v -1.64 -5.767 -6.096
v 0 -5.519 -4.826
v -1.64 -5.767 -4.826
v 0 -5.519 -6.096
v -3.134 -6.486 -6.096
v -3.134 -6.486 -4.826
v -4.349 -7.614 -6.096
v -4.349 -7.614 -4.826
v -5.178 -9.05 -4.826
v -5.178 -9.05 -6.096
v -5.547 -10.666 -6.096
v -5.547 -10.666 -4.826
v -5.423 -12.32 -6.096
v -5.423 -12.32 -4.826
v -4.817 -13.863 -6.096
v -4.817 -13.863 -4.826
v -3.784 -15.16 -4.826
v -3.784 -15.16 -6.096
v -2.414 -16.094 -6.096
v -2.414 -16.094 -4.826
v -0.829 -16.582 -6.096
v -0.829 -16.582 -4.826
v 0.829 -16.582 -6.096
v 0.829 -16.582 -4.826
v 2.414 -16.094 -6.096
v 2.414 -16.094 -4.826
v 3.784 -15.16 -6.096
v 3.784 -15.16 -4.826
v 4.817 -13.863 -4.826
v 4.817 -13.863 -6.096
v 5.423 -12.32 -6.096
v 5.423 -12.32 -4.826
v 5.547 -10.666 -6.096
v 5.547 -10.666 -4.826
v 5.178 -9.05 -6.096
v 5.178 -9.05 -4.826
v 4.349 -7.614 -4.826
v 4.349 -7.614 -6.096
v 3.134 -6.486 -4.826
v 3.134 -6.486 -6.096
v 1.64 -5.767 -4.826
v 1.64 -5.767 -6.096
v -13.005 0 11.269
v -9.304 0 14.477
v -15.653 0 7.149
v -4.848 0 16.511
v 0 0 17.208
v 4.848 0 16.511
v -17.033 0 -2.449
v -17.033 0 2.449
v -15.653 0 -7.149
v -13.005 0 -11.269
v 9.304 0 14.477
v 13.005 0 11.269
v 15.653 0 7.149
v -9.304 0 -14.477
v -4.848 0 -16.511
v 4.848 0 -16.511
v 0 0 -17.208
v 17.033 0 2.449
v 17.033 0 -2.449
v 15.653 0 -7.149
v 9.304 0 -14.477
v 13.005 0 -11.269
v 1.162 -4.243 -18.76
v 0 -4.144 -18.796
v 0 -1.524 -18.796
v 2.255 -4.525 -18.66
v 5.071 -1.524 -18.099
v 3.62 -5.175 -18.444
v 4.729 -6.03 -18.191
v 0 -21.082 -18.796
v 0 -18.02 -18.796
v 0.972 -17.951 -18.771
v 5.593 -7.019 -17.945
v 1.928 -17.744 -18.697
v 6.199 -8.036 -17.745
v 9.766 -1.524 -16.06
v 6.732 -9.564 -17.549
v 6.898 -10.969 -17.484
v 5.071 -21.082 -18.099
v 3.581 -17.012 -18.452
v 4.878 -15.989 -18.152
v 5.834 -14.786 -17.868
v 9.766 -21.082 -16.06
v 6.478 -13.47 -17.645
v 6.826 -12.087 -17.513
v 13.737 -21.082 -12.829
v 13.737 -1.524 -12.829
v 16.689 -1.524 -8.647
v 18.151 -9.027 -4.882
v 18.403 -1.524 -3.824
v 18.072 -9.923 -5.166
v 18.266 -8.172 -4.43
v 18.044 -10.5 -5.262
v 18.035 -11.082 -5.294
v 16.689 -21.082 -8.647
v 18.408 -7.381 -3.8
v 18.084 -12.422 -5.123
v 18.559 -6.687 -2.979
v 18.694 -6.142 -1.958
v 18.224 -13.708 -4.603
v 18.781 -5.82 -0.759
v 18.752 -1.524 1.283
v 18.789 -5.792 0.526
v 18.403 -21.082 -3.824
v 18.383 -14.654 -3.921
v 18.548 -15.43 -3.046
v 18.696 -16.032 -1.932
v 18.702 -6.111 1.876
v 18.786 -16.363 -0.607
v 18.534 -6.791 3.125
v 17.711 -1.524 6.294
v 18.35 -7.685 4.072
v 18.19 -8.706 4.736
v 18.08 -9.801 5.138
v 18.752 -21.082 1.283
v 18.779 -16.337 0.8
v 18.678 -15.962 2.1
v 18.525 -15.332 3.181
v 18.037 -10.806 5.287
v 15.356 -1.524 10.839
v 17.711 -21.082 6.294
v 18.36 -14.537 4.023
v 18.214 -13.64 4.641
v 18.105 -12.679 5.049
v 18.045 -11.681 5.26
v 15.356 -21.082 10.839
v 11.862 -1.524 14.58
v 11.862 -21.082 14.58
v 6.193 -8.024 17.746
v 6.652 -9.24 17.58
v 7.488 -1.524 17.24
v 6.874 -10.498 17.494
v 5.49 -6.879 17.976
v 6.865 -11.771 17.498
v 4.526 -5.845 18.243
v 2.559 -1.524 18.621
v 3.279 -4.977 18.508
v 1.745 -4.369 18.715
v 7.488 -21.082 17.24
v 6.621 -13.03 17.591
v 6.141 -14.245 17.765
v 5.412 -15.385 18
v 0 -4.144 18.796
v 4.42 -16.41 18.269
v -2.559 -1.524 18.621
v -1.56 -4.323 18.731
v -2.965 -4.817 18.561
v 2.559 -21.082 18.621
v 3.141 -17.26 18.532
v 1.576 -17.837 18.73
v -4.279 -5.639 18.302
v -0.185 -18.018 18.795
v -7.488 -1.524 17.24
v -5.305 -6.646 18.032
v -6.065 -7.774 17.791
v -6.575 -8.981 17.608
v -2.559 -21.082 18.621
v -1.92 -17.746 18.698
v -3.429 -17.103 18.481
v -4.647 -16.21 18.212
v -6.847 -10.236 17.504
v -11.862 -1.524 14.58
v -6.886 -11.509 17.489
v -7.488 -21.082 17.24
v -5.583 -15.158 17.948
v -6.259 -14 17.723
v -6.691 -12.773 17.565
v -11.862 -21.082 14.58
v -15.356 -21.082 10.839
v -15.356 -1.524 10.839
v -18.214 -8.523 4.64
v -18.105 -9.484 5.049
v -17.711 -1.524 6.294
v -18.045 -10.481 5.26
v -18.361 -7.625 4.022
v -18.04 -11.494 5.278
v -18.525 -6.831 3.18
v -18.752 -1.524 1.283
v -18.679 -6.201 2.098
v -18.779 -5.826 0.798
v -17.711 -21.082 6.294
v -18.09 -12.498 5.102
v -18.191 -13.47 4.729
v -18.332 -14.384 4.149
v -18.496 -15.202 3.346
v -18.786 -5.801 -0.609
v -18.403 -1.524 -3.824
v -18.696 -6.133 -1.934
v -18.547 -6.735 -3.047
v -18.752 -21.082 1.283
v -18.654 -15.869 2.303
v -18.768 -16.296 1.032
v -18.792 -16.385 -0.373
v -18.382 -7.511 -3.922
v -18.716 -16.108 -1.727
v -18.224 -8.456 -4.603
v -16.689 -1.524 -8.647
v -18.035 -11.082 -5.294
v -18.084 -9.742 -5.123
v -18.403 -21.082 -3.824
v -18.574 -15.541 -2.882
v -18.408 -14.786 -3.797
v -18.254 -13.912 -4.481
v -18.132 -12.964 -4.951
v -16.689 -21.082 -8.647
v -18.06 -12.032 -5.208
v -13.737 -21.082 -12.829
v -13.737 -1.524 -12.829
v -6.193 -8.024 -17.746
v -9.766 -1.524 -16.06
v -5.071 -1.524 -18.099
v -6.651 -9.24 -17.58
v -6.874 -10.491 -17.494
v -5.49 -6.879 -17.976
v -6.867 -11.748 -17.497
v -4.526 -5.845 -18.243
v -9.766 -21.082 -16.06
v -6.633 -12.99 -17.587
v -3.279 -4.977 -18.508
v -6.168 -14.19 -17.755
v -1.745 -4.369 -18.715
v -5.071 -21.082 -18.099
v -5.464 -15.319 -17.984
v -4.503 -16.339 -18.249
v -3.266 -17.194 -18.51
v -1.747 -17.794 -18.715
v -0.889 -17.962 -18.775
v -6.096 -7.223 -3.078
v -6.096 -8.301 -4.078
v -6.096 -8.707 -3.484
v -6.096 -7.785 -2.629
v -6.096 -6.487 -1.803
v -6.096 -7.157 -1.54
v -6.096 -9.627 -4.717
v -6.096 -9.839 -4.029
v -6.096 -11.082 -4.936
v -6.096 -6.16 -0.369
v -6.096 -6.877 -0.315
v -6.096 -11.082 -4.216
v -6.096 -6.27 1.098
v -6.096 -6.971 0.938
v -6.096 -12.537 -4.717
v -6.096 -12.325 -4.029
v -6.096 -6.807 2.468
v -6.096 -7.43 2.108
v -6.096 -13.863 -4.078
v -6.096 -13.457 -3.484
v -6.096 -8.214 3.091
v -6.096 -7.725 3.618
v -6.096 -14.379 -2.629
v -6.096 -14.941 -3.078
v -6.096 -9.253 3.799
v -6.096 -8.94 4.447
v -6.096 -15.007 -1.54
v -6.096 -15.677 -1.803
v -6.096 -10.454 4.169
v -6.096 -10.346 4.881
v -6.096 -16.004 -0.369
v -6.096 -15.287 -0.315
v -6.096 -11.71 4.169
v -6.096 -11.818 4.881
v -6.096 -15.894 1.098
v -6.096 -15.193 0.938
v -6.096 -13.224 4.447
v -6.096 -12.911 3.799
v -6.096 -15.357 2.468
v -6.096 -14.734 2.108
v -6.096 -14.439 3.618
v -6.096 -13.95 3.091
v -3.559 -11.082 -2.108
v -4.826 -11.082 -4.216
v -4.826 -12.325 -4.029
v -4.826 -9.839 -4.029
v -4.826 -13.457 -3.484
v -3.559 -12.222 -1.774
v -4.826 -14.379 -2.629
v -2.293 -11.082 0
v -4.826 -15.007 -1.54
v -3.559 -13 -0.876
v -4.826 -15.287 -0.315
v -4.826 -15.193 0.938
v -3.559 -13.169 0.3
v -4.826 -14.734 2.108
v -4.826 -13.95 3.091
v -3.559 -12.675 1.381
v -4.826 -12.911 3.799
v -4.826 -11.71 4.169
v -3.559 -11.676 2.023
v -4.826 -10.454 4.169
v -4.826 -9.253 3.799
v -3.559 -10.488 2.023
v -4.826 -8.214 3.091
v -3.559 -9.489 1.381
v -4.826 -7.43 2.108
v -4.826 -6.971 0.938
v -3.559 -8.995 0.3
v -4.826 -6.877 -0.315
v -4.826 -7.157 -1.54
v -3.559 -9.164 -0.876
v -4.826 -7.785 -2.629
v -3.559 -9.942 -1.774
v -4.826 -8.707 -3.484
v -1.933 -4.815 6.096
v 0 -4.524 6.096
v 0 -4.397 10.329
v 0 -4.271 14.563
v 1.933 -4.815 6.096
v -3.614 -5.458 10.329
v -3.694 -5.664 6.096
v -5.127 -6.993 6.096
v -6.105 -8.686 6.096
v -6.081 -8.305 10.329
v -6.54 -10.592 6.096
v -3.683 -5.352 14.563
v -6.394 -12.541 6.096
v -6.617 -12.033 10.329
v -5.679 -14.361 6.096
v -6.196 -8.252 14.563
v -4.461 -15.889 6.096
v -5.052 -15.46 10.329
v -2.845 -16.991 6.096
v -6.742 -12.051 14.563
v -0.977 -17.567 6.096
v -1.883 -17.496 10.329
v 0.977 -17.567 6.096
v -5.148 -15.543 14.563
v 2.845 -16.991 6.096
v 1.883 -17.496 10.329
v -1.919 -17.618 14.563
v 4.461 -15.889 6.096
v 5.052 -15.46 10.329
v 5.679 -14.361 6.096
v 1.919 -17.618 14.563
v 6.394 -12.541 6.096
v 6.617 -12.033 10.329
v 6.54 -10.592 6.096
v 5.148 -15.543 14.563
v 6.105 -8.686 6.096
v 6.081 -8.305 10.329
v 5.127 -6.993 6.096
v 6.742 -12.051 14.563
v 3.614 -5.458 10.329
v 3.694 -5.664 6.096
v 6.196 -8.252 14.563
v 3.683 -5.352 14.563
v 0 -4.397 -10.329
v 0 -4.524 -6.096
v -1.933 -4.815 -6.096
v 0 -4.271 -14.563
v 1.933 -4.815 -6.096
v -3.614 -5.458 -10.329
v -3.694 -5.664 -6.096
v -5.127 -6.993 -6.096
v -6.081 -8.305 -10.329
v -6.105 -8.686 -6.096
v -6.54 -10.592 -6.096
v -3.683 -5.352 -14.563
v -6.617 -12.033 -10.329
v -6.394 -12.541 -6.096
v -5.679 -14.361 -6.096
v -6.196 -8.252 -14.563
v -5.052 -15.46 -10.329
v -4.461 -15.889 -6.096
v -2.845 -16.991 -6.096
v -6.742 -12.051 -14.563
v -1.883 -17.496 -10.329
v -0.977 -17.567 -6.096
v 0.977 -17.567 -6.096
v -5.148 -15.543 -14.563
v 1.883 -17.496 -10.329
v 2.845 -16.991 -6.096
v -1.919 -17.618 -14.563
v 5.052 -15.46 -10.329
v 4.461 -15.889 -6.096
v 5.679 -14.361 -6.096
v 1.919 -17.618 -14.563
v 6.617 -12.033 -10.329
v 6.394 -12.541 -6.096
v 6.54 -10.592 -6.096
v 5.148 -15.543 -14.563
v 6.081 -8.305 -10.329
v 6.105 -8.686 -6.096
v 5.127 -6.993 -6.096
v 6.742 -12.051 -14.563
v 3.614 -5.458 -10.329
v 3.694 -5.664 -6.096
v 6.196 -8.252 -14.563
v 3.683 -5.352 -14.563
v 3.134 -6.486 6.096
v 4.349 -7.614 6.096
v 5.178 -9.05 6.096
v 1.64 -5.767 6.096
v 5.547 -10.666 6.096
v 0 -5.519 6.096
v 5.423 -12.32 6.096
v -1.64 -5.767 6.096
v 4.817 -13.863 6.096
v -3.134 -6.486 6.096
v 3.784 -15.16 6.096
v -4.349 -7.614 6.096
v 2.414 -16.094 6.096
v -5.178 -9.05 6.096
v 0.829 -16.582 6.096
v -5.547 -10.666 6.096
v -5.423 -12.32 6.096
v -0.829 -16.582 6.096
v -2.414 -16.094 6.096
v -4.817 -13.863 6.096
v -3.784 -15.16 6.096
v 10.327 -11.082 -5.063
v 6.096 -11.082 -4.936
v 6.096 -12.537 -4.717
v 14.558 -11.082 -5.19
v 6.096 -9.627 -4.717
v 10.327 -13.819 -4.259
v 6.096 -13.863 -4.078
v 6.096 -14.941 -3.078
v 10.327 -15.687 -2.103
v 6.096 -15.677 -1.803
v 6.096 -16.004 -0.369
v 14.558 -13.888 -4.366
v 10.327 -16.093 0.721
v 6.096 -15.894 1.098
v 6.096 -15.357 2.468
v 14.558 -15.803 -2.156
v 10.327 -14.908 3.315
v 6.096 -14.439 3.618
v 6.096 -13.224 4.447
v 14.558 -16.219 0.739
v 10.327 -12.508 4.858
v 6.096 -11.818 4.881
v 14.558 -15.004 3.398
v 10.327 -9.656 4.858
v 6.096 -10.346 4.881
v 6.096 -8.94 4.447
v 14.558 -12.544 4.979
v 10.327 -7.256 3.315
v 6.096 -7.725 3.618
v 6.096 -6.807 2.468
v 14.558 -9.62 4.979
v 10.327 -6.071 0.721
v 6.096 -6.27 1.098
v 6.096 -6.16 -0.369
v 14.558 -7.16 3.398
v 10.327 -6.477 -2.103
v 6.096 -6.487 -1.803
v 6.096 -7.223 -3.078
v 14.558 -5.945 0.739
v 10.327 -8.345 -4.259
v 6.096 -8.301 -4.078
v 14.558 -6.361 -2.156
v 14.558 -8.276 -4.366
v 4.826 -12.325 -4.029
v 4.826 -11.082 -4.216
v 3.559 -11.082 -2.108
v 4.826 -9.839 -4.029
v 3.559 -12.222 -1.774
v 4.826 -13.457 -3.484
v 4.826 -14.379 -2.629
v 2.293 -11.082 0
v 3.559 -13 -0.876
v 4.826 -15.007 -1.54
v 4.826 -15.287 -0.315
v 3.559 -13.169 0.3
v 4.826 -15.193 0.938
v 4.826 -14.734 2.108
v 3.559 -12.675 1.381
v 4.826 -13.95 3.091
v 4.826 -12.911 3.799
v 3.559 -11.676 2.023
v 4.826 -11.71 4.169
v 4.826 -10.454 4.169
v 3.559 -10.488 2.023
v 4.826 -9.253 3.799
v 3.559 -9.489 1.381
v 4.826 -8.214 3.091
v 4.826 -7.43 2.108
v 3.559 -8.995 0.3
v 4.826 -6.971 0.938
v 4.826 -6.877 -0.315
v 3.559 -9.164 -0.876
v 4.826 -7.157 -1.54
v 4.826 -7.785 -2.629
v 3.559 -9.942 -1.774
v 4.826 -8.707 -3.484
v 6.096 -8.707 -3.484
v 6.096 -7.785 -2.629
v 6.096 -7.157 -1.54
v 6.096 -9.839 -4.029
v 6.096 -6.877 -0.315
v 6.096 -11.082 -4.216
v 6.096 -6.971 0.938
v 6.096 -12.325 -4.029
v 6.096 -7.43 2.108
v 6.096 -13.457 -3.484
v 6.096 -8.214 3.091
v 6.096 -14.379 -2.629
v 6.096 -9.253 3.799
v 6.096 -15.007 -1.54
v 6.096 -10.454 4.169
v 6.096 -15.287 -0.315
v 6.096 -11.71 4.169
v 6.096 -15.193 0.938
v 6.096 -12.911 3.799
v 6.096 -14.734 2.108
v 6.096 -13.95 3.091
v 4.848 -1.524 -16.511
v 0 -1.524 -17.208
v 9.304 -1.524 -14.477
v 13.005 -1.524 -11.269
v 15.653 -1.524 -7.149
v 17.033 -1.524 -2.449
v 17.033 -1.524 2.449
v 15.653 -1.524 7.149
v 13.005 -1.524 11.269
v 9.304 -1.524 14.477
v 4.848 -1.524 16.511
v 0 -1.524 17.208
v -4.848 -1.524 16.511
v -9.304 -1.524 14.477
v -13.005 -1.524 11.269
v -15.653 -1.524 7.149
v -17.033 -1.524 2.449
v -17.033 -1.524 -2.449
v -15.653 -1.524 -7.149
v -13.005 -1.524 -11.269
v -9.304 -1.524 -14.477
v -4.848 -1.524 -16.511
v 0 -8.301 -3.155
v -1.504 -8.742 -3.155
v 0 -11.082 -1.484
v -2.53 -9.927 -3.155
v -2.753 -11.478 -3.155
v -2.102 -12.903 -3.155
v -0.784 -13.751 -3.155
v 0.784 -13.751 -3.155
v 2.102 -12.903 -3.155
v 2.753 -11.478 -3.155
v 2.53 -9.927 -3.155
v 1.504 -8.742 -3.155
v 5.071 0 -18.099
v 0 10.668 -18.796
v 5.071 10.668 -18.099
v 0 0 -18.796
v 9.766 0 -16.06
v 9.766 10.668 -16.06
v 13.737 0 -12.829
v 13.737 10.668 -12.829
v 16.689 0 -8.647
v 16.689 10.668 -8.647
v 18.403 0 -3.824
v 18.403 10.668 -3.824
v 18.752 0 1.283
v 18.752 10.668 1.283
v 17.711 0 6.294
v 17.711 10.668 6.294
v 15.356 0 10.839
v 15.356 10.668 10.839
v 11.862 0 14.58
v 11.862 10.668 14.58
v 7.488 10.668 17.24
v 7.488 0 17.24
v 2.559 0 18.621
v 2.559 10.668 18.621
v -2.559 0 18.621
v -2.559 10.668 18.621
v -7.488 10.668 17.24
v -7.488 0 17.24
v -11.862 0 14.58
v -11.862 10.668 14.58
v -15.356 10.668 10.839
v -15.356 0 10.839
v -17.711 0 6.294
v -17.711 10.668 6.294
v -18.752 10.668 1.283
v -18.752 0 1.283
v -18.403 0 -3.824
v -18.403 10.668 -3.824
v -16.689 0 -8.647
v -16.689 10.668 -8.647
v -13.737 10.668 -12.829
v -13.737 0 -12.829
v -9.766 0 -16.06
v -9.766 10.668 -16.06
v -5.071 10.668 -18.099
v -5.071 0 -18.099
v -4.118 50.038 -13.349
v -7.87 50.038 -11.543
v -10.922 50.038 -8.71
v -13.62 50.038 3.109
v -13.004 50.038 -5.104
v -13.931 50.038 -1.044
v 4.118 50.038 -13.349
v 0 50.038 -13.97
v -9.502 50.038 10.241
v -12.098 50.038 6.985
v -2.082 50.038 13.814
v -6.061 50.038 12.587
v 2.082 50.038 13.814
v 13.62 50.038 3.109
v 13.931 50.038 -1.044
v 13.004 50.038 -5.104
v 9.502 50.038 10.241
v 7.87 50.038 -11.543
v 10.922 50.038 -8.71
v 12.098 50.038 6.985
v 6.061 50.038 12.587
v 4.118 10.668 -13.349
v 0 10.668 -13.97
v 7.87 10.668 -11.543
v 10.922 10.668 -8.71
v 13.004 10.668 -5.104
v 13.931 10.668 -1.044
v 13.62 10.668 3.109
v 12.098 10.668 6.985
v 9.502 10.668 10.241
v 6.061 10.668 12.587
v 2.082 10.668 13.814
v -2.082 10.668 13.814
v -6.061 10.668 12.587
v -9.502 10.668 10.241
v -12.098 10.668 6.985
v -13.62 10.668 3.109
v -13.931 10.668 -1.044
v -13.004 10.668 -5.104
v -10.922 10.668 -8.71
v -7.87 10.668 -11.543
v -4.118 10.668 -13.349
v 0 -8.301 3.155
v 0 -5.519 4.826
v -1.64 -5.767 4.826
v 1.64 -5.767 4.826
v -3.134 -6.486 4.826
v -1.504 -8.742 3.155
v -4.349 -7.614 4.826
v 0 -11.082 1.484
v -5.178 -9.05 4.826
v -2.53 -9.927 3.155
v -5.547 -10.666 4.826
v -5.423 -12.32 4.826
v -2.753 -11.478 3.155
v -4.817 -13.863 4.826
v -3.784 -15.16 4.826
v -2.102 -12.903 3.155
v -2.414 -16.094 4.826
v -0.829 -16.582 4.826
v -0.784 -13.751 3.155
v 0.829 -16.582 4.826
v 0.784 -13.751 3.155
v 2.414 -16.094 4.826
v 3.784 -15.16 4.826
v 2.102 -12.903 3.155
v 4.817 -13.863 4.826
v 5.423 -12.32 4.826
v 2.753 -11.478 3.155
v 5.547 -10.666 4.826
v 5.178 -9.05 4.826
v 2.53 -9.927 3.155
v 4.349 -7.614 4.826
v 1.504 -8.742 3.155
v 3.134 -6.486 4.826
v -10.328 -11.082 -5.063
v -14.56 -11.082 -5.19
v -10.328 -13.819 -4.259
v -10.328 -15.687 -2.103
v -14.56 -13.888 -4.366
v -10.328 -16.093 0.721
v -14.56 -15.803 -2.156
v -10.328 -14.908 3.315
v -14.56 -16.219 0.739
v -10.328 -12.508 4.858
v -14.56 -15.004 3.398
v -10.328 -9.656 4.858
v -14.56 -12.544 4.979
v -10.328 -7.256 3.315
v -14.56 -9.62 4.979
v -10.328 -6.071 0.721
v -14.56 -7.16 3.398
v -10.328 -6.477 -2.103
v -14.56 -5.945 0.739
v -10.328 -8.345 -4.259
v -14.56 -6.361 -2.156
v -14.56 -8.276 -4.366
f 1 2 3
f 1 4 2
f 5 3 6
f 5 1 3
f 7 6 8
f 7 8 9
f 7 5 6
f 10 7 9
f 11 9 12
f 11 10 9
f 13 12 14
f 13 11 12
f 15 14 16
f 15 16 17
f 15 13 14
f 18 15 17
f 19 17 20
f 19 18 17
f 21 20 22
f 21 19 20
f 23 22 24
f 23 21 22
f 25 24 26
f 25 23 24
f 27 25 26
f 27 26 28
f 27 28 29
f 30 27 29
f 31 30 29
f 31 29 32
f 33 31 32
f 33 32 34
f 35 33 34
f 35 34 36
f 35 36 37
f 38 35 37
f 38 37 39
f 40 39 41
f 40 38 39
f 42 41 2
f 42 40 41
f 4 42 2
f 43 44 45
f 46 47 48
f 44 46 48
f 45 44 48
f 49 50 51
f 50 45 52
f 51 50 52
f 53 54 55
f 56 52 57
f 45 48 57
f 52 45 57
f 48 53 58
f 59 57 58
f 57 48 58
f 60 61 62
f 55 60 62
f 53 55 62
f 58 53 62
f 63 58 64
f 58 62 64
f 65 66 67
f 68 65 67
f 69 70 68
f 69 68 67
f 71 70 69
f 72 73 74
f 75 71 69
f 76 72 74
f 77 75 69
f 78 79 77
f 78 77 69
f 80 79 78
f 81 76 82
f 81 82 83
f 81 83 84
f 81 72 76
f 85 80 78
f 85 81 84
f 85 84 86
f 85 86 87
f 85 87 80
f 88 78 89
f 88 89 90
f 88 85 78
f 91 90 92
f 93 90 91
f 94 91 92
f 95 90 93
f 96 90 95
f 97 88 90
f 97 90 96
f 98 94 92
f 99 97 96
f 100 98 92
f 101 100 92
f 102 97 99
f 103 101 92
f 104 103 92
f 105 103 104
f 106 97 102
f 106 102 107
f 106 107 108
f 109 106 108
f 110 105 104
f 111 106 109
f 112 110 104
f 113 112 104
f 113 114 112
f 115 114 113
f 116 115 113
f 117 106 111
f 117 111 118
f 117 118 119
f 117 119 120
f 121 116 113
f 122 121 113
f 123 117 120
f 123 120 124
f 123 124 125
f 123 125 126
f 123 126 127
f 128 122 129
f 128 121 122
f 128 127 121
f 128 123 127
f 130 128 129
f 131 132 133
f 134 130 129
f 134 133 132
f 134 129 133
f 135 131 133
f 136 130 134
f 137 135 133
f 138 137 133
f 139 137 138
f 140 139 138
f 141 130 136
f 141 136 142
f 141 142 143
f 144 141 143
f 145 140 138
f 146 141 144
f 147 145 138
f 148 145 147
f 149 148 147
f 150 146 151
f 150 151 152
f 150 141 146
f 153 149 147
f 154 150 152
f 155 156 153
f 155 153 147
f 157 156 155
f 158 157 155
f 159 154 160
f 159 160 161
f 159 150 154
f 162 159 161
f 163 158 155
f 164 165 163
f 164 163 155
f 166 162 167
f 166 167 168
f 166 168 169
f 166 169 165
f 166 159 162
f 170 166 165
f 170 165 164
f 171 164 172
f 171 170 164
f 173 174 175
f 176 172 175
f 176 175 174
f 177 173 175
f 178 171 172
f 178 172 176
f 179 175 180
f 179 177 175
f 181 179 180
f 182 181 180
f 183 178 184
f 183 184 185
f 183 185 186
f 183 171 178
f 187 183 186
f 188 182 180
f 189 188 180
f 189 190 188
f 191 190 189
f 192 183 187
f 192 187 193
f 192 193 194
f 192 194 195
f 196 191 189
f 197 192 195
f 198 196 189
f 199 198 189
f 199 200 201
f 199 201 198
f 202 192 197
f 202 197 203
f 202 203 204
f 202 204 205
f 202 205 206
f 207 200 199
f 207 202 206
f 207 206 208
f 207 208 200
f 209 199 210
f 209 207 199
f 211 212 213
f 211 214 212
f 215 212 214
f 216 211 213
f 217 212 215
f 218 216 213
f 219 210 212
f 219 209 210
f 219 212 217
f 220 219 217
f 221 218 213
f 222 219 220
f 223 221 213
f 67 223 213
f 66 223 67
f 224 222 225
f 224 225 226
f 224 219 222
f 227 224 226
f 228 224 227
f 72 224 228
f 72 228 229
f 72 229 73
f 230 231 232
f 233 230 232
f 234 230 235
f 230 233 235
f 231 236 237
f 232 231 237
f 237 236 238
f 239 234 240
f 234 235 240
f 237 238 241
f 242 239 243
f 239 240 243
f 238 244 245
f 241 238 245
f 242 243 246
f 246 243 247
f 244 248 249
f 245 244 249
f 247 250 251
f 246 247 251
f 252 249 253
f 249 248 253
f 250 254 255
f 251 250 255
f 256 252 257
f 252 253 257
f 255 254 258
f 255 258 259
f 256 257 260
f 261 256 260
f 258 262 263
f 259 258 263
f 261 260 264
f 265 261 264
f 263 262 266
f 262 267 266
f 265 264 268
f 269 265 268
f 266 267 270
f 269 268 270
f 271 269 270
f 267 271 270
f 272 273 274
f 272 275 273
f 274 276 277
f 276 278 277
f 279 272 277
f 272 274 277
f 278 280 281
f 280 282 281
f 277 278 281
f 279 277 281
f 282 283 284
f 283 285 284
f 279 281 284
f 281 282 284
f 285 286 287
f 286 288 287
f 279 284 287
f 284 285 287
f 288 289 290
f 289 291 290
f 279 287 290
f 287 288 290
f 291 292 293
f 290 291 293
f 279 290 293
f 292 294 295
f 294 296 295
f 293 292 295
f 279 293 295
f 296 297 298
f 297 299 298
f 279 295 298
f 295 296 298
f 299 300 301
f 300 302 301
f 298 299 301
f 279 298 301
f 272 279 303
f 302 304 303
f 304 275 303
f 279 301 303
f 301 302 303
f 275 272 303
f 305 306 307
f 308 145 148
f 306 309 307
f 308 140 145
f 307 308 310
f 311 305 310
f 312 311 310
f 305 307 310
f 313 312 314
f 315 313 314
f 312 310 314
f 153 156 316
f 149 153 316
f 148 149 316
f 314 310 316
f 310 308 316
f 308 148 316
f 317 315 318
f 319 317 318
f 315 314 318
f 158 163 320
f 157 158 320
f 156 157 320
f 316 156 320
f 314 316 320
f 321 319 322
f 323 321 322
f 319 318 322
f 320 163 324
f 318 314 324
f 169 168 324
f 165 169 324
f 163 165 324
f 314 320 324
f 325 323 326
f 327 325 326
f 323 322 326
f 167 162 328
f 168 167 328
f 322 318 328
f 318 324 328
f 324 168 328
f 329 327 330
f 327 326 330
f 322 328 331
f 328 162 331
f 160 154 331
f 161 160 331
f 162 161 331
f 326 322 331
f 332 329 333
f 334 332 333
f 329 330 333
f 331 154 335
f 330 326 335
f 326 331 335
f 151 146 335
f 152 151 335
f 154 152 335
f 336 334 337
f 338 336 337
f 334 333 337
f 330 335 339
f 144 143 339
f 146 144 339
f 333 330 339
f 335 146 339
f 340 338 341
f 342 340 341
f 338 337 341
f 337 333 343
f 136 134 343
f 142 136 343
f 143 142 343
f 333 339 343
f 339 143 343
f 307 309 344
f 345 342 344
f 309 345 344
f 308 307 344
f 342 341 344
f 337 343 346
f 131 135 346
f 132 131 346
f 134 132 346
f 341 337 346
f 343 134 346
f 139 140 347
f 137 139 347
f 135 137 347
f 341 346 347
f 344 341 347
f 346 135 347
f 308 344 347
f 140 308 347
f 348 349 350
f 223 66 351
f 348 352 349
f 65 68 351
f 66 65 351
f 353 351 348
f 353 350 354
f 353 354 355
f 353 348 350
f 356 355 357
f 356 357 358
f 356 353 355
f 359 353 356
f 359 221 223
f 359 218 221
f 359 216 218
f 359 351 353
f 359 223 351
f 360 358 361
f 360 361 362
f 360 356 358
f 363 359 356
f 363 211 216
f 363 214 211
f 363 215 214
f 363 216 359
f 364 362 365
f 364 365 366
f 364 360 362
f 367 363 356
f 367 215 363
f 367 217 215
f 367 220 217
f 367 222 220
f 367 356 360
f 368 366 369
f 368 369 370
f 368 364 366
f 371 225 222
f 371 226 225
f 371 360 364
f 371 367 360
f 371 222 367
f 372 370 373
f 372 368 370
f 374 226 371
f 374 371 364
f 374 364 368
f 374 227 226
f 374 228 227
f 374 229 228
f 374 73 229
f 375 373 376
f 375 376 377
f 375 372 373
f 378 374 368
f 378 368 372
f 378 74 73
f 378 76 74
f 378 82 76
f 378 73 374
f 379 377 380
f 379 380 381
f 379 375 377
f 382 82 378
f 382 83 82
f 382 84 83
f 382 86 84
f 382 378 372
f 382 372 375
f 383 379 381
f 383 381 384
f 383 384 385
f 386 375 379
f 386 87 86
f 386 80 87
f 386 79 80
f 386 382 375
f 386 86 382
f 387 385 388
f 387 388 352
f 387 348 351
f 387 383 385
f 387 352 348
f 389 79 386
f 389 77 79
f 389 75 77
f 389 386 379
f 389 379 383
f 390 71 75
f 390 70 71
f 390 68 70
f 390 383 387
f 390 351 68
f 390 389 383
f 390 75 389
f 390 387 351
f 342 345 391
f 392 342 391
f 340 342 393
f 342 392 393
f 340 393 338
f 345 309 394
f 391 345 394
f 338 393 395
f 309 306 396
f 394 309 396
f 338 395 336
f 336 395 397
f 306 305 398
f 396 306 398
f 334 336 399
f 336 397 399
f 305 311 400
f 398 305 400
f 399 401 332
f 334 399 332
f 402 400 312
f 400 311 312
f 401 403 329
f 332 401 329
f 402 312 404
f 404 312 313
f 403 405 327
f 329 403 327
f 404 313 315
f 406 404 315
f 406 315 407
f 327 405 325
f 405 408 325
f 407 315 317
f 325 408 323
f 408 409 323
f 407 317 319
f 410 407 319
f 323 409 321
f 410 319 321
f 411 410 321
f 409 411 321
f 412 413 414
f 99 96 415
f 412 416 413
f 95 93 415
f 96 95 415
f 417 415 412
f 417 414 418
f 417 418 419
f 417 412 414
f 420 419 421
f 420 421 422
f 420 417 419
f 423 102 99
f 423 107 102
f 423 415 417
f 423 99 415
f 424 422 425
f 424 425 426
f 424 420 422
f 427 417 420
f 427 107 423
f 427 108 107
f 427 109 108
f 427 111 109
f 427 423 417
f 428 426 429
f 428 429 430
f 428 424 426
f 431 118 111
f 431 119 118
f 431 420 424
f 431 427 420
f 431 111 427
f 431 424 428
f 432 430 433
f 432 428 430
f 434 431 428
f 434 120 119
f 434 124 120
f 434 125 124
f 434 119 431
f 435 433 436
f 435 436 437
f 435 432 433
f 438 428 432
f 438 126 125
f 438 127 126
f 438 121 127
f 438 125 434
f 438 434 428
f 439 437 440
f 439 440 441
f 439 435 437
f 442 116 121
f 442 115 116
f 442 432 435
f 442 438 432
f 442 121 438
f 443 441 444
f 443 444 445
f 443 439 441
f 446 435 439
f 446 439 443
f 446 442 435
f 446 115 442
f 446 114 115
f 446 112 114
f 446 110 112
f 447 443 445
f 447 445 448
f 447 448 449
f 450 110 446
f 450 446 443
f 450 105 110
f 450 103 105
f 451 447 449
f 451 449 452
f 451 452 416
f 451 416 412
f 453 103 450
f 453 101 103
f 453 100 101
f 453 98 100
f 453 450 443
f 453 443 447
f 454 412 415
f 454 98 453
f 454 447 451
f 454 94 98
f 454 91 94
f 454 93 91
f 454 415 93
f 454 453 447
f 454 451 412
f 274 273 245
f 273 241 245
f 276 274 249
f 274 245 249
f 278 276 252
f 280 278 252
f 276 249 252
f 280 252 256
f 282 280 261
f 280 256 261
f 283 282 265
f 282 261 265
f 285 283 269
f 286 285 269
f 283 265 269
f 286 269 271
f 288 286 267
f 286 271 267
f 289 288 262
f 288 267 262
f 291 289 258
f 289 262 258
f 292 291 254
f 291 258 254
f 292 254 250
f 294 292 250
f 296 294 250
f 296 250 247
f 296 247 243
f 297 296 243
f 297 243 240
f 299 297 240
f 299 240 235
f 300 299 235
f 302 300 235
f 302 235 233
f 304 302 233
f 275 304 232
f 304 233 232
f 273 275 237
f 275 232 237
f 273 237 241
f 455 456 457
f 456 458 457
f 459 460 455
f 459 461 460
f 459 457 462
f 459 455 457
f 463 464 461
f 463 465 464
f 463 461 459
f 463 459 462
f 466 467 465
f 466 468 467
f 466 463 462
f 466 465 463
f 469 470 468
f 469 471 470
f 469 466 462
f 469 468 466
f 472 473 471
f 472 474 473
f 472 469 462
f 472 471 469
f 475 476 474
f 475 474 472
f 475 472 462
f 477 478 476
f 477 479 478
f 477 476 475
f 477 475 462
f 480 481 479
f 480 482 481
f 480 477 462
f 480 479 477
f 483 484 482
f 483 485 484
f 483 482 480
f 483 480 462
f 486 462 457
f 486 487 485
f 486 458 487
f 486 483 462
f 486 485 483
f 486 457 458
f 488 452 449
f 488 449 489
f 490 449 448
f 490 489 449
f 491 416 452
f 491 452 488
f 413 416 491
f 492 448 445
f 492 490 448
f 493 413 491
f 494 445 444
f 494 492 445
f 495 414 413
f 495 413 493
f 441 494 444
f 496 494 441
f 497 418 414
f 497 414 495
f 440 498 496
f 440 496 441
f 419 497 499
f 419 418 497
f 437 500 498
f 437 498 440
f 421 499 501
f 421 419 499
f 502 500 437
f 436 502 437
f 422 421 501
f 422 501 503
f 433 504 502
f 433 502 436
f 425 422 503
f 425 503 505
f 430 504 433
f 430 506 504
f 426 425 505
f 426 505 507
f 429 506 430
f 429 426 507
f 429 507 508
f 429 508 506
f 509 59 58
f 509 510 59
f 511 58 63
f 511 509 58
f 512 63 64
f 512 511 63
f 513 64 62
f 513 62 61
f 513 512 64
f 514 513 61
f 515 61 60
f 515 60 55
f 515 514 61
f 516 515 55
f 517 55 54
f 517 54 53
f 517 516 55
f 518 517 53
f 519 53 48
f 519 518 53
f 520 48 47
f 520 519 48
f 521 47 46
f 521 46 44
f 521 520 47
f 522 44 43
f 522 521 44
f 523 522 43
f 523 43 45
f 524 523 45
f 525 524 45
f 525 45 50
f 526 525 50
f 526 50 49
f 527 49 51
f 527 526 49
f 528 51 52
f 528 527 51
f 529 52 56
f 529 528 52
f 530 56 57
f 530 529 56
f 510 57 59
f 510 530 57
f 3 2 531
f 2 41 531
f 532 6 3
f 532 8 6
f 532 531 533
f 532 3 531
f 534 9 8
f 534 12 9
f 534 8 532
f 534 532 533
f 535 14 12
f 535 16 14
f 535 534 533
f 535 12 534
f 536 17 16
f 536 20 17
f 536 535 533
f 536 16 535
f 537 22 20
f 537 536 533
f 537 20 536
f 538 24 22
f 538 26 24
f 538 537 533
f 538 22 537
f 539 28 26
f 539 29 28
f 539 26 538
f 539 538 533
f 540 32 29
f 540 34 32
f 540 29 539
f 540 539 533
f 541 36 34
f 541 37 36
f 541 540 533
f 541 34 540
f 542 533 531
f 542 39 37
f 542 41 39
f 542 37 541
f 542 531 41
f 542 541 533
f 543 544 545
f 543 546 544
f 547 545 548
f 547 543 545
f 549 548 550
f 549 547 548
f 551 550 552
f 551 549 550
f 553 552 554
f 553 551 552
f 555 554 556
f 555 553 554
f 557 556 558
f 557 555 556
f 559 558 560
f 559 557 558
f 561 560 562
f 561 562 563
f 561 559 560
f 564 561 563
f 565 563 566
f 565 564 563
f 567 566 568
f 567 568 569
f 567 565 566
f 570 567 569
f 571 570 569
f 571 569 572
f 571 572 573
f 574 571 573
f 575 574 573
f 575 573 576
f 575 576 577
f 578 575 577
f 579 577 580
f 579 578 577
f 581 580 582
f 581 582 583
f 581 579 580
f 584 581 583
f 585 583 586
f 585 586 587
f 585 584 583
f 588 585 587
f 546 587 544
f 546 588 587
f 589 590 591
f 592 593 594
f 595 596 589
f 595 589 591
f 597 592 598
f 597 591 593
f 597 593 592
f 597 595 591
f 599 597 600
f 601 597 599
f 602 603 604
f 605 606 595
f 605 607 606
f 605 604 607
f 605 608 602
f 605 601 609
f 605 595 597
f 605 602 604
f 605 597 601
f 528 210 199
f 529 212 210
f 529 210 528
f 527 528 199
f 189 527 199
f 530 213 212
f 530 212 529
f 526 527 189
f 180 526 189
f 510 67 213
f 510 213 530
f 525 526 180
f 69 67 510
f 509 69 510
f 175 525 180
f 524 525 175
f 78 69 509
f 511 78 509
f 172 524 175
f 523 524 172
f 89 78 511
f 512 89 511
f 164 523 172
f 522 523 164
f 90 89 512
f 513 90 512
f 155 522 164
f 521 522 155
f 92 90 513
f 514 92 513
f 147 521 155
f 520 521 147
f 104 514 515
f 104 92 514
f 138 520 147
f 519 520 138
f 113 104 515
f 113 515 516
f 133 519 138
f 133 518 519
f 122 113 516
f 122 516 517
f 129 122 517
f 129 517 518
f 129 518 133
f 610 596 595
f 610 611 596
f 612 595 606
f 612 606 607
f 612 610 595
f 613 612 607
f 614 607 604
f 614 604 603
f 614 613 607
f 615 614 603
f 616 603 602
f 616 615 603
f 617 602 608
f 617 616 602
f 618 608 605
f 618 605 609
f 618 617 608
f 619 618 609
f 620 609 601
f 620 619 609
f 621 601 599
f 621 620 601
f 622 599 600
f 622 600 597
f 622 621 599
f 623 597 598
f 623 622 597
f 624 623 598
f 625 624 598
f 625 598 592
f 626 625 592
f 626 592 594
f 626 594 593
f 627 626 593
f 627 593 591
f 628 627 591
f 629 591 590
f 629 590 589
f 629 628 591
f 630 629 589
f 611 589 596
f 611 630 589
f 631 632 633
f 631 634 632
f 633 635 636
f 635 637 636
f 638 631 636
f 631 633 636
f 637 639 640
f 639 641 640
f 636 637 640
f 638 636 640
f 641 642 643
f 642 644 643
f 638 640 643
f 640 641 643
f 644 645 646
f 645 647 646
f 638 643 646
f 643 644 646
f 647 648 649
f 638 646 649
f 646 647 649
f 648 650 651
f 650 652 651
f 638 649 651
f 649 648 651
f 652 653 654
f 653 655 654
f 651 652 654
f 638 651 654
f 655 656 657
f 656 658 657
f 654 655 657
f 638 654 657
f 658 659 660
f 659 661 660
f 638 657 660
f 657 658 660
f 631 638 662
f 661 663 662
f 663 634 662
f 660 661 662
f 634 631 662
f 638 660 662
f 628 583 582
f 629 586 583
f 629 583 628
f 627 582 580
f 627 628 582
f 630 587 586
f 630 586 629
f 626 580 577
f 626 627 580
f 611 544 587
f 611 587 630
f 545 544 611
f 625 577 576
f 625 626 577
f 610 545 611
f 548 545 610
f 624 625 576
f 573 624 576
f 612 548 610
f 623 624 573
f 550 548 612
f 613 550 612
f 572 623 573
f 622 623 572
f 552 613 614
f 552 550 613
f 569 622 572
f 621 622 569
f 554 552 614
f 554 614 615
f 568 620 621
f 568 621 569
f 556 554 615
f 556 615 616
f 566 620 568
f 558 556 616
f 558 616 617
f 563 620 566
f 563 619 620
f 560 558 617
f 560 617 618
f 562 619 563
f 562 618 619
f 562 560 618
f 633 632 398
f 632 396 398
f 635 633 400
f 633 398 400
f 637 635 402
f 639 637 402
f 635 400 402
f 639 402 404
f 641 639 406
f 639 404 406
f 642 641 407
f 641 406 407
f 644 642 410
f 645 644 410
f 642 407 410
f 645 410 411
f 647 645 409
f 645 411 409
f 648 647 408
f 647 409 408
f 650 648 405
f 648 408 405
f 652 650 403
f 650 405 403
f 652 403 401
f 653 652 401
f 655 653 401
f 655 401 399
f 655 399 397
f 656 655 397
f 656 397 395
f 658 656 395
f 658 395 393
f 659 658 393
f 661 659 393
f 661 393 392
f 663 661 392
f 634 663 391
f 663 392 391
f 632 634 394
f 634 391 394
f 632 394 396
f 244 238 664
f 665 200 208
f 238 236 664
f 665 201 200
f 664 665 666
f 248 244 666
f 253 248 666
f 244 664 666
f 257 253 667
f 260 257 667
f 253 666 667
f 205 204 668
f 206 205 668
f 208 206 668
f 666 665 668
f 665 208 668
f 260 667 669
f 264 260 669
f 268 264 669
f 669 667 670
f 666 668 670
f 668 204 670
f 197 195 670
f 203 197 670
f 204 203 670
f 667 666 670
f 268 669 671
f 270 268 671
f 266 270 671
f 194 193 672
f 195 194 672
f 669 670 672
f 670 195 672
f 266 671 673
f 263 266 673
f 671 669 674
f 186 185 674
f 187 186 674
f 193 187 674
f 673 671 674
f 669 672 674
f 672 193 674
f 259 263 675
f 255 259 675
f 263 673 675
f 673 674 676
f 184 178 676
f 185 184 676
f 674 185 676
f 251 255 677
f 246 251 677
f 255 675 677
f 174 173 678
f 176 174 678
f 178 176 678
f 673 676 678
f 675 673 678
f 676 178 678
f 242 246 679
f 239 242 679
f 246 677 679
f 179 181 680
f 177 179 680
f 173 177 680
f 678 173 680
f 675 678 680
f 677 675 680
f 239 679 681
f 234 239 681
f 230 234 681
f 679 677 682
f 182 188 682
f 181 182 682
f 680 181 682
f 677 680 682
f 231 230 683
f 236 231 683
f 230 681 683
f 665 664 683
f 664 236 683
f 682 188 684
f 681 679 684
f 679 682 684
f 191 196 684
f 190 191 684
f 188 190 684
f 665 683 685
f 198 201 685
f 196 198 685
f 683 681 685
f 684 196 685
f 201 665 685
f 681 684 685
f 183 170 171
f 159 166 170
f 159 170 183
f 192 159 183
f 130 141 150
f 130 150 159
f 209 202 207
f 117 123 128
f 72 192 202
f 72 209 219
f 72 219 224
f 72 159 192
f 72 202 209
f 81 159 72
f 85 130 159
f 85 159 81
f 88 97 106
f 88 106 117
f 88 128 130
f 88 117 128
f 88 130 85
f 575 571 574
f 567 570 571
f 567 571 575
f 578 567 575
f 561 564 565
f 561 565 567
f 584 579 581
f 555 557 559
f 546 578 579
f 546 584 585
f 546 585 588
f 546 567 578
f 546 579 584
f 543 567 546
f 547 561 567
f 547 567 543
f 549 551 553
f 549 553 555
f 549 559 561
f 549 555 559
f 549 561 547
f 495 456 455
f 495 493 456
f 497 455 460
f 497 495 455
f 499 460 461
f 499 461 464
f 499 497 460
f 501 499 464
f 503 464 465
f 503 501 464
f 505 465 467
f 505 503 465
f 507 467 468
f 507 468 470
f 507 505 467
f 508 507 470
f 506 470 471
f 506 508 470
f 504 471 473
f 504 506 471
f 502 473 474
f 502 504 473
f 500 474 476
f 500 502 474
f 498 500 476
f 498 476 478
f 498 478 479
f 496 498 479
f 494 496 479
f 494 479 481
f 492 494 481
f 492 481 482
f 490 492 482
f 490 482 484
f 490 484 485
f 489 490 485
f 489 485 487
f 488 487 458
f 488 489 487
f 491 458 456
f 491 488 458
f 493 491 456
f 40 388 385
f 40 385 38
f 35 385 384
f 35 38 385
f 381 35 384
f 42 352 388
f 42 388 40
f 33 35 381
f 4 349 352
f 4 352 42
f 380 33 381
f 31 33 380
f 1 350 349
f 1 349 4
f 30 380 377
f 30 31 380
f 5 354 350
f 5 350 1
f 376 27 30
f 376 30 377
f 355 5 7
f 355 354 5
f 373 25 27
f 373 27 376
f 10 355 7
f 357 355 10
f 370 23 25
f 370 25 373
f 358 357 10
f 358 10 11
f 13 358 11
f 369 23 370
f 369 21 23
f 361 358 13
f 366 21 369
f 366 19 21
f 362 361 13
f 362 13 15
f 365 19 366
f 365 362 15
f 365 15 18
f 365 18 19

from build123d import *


with BuildPart() as part:
    # Sketch1 → Revolve1 (revolve)
    with BuildSketch(Plane(origin=(0, 0, 0), x_dir=(0, 0, -1), z_dir=(1, 0, 0))):
        Polygon((0, 50.038), (13.97, 50.038), (13.97, 10.668), (18.796, 10.668), (18.796, 0), (17.2085, 0), (17.2085, -1.524), (18.796, -1.524), (18.796, -21.082), (0, -21.082), align=None)
    revolve(axis=Axis((0, 33.650567532, 0), (0, -1, 0)))


with BuildPart() as body_2:
    # Split1: the piece on the far side of the plane
    add(part.part)
    split(bisect_by=Plane(origin=(0, 0, 0), x_dir=(0, 0, -1), z_dir=(0, -1, 0)), keep=Keep.BOTTOM)


with BuildPart() as part_1:
    add(part.part)

    # Split1
    split(bisect_by=Plane(origin=(0, 0, 0), x_dir=(0, 0, -1), z_dir=(0, -1, 0)), keep=Keep.TOP)

    # Sketch3 → 1/8 NPT Tapped Hole1 (revolve, cut)
    with BuildSketch(Plane(origin=(18.796, -11.082, 0), x_dir=(0, 0, -1), z_dir=(0, 1, 0))):
        Polygon((0, 0), (0, 16.503468714), (4.2164, 13.97), (4.2164, 12.7), (4.936180893, 12.7), (5.3164359, 0), align=None)
    f_1_8_npt_tapped_hole1 = revolve(axis=Axis((25.146, -11.082, 0), (-1, 0, 0)), mode=Mode.SUBTRACT)

    # Mirror1: 1/8 NPT Tapped Hole1 across plane
    add(f_1_8_npt_tapped_hole1.mirror(Plane(origin=(0, 0, 0), x_dir=(0, 0, 1), z_dir=(1, 0, 0))), mode=Mode.SUBTRACT)

    # Sketch5 → 1/4 NPT Tapped Hole1 (revolve, cut)
    with BuildSketch(Plane(origin=(0, -11.082, -18.796), x_dir=(0, 1, 0), z_dir=(1, 0, 0))):
        Polygon((0, 0), (0, 17.312347279), (5.5626, 13.97), (5.5626, 12.7), (6.557983593, 12.7), (6.9382386, 0), align=None)
    f_1_4_npt_tapped_hole1 = revolve(axis=Axis((0, -11.082, -25.146), (0, 0, 1)), mode=Mode.SUBTRACT)

    # Mirror2: 1/4 NPT Tapped Hole1 across plane
    add(f_1_4_npt_tapped_hole1.mirror(Plane.XY), mode=Mode.SUBTRACT)


solid = Compound([body_2.part, part_1.part])
